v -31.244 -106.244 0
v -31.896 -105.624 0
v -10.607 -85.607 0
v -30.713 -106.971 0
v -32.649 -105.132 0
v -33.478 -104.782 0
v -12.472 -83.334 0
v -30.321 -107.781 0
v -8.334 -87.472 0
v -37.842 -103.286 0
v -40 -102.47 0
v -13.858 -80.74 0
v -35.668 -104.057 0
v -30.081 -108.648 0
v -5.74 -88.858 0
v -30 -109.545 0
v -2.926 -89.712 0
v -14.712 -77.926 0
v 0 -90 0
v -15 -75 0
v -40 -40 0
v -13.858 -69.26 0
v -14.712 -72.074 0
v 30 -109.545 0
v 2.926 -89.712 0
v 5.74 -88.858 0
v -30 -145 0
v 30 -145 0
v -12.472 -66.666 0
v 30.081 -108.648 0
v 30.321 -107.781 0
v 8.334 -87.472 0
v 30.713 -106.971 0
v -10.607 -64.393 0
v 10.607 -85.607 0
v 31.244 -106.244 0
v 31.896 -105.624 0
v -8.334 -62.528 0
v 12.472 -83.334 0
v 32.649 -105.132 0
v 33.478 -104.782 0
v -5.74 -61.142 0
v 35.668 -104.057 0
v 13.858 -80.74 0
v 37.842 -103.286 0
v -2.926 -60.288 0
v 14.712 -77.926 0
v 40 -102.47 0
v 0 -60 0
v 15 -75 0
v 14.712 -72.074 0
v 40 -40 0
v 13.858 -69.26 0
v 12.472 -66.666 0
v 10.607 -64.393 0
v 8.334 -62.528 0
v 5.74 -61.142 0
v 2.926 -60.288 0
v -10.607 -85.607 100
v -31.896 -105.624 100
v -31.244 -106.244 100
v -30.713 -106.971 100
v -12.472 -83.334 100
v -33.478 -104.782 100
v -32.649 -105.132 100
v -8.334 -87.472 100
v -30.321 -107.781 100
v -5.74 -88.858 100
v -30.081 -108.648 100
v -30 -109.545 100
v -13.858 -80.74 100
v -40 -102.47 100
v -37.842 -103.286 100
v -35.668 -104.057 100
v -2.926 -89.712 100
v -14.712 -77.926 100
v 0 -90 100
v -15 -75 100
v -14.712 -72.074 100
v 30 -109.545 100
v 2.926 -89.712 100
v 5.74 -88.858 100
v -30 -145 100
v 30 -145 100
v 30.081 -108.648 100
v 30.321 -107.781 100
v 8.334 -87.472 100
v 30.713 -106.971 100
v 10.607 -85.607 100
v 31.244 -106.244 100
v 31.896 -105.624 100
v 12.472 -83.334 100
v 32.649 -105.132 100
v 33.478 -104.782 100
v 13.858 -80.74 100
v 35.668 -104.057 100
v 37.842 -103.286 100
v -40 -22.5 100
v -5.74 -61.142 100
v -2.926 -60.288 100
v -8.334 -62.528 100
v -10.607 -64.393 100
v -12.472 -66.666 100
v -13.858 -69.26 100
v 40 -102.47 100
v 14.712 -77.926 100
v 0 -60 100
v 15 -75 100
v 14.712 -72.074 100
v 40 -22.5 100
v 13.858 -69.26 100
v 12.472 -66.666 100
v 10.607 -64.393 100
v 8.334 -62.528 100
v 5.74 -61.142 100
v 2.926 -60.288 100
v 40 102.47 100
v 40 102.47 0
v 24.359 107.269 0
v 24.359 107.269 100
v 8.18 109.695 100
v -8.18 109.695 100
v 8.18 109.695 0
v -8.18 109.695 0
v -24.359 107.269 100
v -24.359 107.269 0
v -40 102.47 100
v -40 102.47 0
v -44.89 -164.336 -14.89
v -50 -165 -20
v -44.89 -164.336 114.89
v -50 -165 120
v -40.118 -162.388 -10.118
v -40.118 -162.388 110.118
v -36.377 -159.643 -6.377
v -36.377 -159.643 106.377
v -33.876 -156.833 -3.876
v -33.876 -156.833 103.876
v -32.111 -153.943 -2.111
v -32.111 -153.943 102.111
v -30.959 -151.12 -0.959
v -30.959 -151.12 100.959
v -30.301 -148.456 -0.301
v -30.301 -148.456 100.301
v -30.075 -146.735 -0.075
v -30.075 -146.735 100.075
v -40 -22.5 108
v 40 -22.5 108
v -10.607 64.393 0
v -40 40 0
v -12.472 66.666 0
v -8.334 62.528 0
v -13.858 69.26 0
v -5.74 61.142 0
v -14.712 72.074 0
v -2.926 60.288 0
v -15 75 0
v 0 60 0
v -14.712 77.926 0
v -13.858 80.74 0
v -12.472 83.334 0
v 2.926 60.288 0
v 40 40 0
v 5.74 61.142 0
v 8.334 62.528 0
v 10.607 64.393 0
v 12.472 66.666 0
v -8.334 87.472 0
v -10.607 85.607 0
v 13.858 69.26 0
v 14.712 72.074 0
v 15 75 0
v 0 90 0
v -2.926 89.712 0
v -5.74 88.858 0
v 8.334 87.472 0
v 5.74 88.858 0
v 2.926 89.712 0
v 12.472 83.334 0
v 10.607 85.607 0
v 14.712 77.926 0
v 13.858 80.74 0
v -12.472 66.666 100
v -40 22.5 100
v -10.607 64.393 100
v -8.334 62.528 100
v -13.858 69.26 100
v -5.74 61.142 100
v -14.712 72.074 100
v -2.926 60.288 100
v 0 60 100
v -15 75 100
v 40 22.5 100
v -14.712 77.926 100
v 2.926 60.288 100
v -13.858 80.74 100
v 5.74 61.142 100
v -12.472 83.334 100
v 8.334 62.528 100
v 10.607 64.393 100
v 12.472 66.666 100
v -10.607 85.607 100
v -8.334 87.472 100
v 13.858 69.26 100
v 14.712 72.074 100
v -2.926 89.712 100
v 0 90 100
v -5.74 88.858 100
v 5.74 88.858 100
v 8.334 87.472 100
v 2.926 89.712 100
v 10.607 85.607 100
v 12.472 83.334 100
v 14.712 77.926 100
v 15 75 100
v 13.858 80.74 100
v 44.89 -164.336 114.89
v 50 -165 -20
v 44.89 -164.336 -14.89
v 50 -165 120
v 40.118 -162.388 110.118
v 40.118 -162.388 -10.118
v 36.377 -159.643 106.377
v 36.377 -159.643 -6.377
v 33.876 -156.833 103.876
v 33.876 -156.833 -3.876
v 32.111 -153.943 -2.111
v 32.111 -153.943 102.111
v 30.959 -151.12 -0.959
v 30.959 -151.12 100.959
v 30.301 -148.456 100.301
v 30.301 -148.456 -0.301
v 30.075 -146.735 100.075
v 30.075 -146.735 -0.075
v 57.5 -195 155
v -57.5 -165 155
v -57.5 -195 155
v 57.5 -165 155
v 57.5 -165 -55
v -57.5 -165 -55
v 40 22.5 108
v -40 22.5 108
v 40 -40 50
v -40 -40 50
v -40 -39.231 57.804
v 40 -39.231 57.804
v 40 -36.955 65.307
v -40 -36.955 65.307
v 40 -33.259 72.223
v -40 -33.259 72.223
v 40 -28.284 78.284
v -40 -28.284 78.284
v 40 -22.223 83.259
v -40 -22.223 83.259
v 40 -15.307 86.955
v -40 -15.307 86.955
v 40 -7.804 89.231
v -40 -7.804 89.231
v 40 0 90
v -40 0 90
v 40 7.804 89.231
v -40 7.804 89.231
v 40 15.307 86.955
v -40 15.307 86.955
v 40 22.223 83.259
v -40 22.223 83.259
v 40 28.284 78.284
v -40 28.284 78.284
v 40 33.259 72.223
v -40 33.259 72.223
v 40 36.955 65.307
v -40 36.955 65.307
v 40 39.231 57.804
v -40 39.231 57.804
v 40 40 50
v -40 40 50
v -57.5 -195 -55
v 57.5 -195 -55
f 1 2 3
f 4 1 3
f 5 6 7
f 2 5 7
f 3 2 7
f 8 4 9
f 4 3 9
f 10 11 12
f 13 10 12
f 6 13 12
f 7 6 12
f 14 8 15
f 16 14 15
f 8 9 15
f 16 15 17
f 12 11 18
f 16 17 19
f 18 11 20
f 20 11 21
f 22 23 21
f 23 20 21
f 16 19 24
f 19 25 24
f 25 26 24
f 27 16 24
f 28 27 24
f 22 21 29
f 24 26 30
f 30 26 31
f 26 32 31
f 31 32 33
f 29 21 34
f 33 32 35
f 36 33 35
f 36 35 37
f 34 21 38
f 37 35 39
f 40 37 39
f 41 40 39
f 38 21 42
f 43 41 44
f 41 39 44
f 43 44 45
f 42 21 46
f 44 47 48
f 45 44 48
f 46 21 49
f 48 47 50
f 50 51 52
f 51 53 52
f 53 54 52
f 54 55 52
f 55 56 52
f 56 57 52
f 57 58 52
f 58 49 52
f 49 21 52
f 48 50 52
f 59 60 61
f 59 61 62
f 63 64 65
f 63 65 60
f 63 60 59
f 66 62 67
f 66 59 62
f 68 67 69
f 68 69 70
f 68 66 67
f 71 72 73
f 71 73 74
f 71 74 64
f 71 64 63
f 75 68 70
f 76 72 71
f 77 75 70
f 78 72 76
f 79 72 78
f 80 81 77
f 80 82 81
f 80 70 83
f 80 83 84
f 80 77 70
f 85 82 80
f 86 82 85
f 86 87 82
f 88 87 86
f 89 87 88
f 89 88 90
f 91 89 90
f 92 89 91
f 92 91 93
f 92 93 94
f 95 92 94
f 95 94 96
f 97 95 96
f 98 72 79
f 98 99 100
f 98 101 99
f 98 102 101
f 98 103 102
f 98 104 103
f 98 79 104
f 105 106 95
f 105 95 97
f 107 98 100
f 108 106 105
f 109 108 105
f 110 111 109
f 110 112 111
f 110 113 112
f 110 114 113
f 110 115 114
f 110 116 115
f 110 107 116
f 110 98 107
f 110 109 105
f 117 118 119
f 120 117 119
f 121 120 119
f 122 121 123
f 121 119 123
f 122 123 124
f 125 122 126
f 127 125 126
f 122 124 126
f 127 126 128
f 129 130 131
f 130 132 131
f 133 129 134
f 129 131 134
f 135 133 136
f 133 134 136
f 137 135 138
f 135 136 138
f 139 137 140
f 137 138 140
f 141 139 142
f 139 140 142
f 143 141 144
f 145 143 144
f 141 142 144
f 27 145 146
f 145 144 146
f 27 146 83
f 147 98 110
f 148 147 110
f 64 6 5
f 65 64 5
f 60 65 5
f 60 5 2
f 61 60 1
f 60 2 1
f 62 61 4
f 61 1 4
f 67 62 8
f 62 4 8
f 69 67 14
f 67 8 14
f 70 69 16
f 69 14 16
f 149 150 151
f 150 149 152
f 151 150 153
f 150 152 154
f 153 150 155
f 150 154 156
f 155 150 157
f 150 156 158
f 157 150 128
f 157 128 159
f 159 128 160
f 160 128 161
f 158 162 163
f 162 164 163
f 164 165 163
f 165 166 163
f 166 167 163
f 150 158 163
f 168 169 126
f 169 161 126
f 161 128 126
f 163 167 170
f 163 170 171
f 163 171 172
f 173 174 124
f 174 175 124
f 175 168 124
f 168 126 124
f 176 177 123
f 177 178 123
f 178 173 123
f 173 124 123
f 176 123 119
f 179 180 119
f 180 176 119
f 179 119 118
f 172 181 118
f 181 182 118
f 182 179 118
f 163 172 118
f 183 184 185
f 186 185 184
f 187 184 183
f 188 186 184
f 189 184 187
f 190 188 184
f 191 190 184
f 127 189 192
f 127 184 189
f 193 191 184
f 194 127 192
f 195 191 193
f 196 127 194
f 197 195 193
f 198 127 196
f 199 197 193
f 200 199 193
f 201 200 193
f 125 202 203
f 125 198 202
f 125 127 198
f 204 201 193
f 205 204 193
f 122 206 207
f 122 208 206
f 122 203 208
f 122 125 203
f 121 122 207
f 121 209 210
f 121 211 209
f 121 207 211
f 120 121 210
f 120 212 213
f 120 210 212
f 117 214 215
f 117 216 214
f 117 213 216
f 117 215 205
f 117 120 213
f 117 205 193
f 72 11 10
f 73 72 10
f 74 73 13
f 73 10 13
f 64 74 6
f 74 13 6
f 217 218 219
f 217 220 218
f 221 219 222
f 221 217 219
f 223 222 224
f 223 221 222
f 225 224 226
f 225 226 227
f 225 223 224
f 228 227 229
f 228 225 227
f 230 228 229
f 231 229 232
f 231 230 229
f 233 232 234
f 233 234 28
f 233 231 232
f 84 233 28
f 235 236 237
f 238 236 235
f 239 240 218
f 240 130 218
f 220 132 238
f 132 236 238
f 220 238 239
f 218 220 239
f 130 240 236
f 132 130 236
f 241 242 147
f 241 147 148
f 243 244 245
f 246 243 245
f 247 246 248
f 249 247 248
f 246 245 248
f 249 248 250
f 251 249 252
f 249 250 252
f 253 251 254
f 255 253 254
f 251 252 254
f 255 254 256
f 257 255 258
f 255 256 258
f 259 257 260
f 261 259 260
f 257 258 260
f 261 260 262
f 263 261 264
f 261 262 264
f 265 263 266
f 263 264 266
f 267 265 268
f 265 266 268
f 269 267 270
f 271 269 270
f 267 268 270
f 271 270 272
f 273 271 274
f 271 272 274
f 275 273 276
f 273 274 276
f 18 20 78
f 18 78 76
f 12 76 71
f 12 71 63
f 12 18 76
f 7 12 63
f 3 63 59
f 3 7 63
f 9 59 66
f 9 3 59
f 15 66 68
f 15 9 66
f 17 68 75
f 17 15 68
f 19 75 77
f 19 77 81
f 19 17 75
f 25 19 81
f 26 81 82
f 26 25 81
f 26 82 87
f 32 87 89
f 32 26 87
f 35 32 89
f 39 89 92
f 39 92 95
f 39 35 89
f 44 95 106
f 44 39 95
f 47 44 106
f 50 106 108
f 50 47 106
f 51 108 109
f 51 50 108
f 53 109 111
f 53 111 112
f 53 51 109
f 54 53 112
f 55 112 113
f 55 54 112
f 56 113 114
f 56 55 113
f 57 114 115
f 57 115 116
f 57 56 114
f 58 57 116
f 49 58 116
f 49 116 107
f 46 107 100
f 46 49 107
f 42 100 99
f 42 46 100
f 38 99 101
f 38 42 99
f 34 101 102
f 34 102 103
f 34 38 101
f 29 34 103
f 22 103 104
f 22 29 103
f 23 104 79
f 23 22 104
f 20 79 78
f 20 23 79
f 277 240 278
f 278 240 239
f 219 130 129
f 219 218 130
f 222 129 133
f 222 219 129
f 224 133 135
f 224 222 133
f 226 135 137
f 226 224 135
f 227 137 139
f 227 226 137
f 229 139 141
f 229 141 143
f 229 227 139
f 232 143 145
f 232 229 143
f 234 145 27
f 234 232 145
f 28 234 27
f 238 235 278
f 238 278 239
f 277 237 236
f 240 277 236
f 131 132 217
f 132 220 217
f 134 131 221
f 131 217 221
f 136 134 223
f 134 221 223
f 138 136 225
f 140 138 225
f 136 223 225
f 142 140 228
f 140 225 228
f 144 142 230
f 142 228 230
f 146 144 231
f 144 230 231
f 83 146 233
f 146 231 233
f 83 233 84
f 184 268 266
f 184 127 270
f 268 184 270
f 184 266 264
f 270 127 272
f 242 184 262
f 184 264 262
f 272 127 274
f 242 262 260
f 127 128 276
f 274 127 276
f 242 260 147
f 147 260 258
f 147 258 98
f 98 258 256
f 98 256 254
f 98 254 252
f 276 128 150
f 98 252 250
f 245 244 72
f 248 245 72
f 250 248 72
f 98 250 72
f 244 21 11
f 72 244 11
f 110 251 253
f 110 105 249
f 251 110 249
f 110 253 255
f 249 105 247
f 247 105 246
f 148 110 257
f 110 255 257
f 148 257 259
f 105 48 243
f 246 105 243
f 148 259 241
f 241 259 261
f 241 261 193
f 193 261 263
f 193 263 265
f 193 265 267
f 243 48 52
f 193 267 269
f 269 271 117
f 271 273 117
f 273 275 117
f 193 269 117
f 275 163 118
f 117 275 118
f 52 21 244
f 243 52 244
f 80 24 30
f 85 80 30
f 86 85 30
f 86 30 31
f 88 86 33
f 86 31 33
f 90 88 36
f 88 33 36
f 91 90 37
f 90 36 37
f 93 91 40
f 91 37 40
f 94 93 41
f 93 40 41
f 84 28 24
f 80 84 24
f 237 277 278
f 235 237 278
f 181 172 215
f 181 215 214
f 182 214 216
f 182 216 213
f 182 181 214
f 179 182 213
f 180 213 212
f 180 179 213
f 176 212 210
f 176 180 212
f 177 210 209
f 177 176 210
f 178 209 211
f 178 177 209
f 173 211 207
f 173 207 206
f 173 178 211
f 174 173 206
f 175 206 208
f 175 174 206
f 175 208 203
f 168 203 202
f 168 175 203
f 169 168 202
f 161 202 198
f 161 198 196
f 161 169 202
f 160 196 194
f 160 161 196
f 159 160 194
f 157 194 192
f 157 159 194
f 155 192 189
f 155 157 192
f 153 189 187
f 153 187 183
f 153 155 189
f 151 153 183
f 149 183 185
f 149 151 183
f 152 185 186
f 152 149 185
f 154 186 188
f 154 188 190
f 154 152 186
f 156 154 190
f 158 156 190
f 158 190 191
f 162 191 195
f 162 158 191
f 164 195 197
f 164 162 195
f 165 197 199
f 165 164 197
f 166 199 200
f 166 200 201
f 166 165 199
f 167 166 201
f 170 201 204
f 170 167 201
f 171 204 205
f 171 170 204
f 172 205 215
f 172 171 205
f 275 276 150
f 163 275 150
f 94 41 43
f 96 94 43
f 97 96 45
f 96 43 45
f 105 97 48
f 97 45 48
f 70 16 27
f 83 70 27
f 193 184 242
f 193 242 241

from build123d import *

# Parameters (mm, degrees)
SKETCH1_R           = 15
BOSS_EXTRUDE1_DEPTH = 100
BOSS_EXTRUDE2_START = -50
SKETCH2_W           = 115
SKETCH2_H           = 30
BOSS_EXTRUDE2_DEPTH = 105
FILLET1_R           = 20
SKETCH3_W           = 80
SKETCH3_H           = 45
BOSS_EXTRUDE3_DEPTH = 8
CUT_EXTRUDE1_DEPTH  = 268.5


with BuildPart() as part:
    # Sketch1 → Boss-Extrude1 (new body)
    with BuildSketch(Plane.XY):
        with BuildLine():
            Line((-40, 102.46950766), (-40, -102.46950766))
            ThreePointArc((-40, -102.46950766), (-36.757315886, -103.676900652), (-33.47826087, -104.781706653))
            ThreePointArc((-33.47826087, -104.781706653), (-30.962135735, -106.595672378), (-30, -109.544511501))
            Line((-30, -109.544511501), (-30, -165))
            Line((-30, -165), (30, -165))
            Line((30, -165), (30, -109.544511501))
            ThreePointArc((30, -109.544511501), (30.962135735, -106.595672378), (33.47826087, -104.781706653))
            ThreePointArc((33.47826087, -104.781706653), (36.757315886, -103.676900652), (40, -102.46950766))
            Line((40, -102.46950766), (40, 102.46950766))
            ThreePointArc((40, 102.46950766), (0, 110), (-40, 102.46950766))
        make_face()
        with Locations((0, 75)):
            Circle(SKETCH1_R, mode=Mode.SUBTRACT)
        with Locations(Location((0, -75, 0), (0, 0, 180))):
            Circle(SKETCH1_R, mode=Mode.SUBTRACT)
    extrude(amount=BOSS_EXTRUDE1_DEPTH)

    # Sketch2 → Boss-Extrude2 (add, symmetric)
    with BuildSketch(Plane.XY.offset(100).offset(BOSS_EXTRUDE2_START)):
        with Locations((0, -180)):
            Rectangle(SKETCH2_W, SKETCH2_H)
    extrude(amount=BOSS_EXTRUDE2_DEPTH, both=True)

    # Fillet1
    fillet1_edges = [part.edges().sort_by_distance(p)[0] for p in [
        (0, -165, 0),
        (0, -165, 100),
        (30, -165, 50),
        (-30, -165, 50),
    ]]
    fillet(fillet1_edges, radius=FILLET1_R)

    # Sketch3 → Boss-Extrude3 (add)
    with BuildSketch(Plane.XY.offset(100)):
        Rectangle(SKETCH3_W, SKETCH3_H)
    extrude(amount=BOSS_EXTRUDE3_DEPTH)

    # Sketch4 → Cut-Extrude1 (cut, through all)
    with BuildSketch(Plane.ZY.offset(40)):
        with BuildLine():
            Line((-70, -40), (50, -40))
            ThreePointArc((50, -40), (90, 0), (50, 40))
            Line((50, 40), (-70, 40))
            Line((-70, 40), (-70, -40))
        make_face()
    extrude(amount=-CUT_EXTRUDE1_DEPTH, mode=Mode.SUBTRACT)


solid = part.part
